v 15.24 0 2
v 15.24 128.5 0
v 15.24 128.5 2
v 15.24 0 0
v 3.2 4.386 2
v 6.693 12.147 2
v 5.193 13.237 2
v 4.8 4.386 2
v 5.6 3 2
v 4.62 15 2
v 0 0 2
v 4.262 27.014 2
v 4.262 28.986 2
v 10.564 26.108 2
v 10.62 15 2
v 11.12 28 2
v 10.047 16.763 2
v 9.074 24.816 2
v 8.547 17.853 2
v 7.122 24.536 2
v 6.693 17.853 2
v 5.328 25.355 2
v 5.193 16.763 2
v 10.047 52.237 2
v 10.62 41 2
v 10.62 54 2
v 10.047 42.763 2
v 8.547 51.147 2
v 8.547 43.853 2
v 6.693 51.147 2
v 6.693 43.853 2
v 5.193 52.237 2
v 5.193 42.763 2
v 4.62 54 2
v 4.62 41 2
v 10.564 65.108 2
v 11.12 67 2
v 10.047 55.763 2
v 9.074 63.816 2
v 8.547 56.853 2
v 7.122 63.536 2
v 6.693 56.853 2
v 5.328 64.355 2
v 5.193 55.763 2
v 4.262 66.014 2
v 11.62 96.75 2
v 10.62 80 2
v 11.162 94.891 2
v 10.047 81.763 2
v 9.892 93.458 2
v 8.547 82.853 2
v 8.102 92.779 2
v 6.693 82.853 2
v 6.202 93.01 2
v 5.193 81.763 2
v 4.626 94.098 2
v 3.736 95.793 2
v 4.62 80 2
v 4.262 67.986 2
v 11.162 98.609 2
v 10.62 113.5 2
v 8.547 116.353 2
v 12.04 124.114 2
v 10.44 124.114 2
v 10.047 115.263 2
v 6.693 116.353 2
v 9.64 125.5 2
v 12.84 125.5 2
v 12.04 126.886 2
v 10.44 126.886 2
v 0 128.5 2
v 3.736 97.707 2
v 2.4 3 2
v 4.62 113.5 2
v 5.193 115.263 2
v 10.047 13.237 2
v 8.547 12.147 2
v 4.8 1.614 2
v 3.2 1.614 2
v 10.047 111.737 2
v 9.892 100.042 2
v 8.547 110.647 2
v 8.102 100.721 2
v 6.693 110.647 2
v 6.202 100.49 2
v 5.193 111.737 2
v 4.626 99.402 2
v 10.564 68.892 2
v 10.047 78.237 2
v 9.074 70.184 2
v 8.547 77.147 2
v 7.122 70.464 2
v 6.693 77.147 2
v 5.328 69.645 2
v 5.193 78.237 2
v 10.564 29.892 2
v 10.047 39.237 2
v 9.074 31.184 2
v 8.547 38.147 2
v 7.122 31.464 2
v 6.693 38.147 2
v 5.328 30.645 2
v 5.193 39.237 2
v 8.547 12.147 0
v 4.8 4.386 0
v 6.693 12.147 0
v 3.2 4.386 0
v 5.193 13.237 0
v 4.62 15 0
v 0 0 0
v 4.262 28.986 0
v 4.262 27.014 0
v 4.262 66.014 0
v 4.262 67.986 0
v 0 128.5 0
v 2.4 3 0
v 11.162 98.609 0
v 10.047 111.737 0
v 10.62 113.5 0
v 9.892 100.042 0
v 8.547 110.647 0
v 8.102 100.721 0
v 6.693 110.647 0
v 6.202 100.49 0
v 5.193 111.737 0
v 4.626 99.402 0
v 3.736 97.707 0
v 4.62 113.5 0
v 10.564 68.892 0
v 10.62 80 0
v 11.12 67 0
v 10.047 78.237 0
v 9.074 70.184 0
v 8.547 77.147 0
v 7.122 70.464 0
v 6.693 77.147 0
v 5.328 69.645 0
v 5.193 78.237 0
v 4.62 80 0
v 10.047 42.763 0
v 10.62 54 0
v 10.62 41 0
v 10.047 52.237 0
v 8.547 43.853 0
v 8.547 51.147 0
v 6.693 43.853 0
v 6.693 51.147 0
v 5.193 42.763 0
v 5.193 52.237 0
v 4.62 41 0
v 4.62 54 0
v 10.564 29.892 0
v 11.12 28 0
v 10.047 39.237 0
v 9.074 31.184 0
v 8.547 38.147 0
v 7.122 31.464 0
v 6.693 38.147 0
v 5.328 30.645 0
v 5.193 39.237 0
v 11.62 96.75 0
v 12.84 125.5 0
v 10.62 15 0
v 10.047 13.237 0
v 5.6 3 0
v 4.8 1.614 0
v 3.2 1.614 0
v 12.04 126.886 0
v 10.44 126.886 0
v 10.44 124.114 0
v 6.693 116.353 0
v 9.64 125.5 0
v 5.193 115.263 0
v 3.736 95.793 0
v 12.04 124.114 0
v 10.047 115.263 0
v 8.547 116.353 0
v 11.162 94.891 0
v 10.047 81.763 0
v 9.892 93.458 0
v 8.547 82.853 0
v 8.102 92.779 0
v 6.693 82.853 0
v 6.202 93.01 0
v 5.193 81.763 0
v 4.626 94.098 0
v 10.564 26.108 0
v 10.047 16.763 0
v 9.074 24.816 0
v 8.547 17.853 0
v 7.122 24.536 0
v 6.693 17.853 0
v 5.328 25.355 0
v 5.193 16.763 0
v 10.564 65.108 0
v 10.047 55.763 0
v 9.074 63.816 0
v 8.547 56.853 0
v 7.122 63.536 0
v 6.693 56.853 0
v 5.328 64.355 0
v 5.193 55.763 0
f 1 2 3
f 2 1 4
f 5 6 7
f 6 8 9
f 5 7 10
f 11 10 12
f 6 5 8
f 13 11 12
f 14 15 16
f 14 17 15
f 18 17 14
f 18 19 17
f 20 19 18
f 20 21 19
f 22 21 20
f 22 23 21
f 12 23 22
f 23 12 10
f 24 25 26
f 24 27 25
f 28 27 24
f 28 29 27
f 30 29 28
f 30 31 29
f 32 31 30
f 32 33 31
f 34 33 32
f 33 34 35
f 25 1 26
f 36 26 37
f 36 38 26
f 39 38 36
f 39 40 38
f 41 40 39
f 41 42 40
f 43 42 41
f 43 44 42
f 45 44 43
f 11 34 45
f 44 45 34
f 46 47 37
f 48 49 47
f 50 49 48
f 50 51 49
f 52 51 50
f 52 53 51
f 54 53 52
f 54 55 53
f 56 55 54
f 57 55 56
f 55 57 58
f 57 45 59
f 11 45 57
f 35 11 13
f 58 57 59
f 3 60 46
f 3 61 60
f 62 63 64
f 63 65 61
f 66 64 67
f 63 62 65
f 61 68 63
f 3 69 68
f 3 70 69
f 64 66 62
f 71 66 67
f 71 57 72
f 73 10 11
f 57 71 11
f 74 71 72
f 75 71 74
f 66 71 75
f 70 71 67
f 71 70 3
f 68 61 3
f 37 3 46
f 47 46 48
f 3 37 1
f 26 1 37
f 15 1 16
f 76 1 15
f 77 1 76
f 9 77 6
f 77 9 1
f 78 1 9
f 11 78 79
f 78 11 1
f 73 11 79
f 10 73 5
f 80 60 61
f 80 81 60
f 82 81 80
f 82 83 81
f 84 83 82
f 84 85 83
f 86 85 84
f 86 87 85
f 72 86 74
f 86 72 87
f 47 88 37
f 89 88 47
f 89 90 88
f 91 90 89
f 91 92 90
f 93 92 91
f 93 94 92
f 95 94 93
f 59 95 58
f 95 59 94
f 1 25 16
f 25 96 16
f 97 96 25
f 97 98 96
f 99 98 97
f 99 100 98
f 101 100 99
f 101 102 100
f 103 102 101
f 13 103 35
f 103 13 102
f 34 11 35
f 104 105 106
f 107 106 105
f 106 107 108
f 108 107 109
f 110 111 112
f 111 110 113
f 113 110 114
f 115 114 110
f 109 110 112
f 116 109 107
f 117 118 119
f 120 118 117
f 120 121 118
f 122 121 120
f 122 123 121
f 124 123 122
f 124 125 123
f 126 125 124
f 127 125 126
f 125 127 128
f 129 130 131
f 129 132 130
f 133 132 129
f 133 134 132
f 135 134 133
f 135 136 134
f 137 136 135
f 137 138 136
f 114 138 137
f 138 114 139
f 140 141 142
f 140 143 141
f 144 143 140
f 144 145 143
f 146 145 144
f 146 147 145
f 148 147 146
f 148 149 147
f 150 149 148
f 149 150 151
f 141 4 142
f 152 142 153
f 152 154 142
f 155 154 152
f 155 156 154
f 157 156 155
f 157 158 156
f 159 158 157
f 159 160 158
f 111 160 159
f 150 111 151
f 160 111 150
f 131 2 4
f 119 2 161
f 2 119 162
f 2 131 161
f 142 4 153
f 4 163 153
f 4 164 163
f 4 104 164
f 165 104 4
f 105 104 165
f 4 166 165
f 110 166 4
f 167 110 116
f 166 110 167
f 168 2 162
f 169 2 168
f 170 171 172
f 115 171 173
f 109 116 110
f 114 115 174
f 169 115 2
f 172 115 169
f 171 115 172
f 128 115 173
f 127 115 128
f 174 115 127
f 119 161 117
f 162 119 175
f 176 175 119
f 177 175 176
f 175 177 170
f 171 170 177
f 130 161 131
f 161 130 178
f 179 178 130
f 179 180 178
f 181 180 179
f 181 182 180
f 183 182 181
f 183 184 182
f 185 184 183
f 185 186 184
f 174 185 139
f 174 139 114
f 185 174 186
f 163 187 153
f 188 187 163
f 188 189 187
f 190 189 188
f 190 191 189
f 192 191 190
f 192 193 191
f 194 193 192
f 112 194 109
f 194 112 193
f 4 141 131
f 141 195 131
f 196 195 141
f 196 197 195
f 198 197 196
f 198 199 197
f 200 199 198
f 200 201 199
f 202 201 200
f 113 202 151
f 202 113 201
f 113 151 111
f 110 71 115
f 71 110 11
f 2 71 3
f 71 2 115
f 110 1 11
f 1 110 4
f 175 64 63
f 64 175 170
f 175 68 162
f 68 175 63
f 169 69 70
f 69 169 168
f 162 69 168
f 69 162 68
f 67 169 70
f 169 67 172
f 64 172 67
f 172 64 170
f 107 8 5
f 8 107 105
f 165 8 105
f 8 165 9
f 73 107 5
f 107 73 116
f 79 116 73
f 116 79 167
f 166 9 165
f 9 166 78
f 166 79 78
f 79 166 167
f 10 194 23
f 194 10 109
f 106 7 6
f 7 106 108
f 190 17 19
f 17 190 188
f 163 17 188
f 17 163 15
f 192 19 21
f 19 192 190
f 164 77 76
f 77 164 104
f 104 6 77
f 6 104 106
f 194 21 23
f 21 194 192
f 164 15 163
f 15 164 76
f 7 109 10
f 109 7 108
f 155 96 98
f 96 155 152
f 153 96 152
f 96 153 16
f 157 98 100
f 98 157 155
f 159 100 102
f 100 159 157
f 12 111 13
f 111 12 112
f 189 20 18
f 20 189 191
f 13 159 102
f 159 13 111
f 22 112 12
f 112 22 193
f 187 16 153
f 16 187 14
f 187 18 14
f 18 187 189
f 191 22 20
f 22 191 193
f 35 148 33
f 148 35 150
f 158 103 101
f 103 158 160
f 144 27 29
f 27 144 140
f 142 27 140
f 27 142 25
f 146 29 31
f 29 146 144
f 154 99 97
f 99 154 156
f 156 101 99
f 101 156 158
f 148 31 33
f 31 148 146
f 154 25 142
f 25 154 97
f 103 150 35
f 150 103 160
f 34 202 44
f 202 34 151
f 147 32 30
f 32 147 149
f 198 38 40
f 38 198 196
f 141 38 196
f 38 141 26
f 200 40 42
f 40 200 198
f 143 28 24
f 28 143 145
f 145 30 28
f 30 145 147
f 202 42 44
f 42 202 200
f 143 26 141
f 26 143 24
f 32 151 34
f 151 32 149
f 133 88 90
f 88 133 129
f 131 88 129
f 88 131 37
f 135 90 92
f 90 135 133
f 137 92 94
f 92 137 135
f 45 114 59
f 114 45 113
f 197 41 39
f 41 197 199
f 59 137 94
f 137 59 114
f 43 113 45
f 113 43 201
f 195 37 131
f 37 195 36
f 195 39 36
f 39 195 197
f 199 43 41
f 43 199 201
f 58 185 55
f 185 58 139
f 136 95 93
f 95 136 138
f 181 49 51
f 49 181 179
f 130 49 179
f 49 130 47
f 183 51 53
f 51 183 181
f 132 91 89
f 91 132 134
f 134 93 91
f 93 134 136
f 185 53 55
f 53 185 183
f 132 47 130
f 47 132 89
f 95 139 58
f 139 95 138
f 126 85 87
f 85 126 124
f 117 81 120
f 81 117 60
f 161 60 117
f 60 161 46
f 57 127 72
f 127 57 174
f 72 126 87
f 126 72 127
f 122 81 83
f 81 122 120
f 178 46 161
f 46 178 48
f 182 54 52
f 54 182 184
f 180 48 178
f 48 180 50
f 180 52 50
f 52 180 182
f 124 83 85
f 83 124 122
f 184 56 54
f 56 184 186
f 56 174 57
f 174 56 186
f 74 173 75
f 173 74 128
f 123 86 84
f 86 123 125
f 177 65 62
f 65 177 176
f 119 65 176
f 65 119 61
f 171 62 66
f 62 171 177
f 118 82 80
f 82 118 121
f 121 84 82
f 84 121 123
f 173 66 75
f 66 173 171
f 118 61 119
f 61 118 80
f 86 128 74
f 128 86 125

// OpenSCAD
// Dimensions
panel_width = 3 * 5.08;    // 3HP
panel_height = 128.5;  // 3U
panel_thickness = 2.00;

// Mounting holes
mount_offset_y = 3;
mount_offset_x = 4;
mounting_hole_diameter = 3.2; // M3

// Compoonent hole sizes
jack_hole_diameter = 6; // 3.5mm
toggle_hole_diameter = 7;
pot_hole_diameter = 8;

module jack(y_pos) {
    translate([panel_width / 2, y_pos, panel_thickness / 2])
        cylinder(d = jack_hole_diameter, h = panel_thickness + 1, center = true);
}

module toggle(y_pos) {
    translate([panel_width / 2, y_pos, panel_thickness / 2])
        cylinder(d = toggle_hole_diameter, h = panel_thickness + 1, center = true);
}

module pot(y_pos) {
    translate([panel_width / 2, y_pos, panel_thickness / 2])
        cylinder(d = pot_hole_diameter, h = panel_thickness + 1, center = true);
}

module mounting_hole(x_pos, y_pos) {
    translate([x_pos, y_pos, panel_thickness / 2])
        cylinder(d = mounting_hole_diameter, h = panel_thickness + 1, center = true);
}


jack_height = 10;
toggle_height = 15;
pot_height = 22.5;

buffer = 0.5;

jack2toggle_y = (jack_height + toggle_height) / 2 + buffer;
jack2jack_y = jack_height + buffer;
jack2pot_y = (jack_height + pot_height) / 2 + buffer;

jack1_y = 15;
toggle1_y = jack1_y + jack2toggle_y;
jack2_y = toggle1_y + jack2toggle_y;
jack3_y = jack2_y + jack2toggle_y;
toggle2_y = jack3_y + jack2toggle_y;
jack4_y = toggle2_y + jack2toggle_y;
pot1_y = jack4_y + jack2pot_y;
jack5_y = pot1_y + jack2pot_y;

module panel() {
    difference() {
        // Base panel
        cube([panel_width, panel_height, panel_thickness]);

        // Mounting holes
        mounting_hole(panel_width - mount_offset_x, panel_height - mount_offset_y);
        mounting_hole(mount_offset_x, mount_offset_y);

        // Components (Jacks, Toggles, Pot)
        jack(jack1_y);
        toggle(toggle1_y);
        jack(jack2_y);
        jack(jack3_y);
        toggle(toggle2_y);
        jack(jack4_y);
        pot(pot1_y);
        jack(jack5_y);
    }
}

panel();
